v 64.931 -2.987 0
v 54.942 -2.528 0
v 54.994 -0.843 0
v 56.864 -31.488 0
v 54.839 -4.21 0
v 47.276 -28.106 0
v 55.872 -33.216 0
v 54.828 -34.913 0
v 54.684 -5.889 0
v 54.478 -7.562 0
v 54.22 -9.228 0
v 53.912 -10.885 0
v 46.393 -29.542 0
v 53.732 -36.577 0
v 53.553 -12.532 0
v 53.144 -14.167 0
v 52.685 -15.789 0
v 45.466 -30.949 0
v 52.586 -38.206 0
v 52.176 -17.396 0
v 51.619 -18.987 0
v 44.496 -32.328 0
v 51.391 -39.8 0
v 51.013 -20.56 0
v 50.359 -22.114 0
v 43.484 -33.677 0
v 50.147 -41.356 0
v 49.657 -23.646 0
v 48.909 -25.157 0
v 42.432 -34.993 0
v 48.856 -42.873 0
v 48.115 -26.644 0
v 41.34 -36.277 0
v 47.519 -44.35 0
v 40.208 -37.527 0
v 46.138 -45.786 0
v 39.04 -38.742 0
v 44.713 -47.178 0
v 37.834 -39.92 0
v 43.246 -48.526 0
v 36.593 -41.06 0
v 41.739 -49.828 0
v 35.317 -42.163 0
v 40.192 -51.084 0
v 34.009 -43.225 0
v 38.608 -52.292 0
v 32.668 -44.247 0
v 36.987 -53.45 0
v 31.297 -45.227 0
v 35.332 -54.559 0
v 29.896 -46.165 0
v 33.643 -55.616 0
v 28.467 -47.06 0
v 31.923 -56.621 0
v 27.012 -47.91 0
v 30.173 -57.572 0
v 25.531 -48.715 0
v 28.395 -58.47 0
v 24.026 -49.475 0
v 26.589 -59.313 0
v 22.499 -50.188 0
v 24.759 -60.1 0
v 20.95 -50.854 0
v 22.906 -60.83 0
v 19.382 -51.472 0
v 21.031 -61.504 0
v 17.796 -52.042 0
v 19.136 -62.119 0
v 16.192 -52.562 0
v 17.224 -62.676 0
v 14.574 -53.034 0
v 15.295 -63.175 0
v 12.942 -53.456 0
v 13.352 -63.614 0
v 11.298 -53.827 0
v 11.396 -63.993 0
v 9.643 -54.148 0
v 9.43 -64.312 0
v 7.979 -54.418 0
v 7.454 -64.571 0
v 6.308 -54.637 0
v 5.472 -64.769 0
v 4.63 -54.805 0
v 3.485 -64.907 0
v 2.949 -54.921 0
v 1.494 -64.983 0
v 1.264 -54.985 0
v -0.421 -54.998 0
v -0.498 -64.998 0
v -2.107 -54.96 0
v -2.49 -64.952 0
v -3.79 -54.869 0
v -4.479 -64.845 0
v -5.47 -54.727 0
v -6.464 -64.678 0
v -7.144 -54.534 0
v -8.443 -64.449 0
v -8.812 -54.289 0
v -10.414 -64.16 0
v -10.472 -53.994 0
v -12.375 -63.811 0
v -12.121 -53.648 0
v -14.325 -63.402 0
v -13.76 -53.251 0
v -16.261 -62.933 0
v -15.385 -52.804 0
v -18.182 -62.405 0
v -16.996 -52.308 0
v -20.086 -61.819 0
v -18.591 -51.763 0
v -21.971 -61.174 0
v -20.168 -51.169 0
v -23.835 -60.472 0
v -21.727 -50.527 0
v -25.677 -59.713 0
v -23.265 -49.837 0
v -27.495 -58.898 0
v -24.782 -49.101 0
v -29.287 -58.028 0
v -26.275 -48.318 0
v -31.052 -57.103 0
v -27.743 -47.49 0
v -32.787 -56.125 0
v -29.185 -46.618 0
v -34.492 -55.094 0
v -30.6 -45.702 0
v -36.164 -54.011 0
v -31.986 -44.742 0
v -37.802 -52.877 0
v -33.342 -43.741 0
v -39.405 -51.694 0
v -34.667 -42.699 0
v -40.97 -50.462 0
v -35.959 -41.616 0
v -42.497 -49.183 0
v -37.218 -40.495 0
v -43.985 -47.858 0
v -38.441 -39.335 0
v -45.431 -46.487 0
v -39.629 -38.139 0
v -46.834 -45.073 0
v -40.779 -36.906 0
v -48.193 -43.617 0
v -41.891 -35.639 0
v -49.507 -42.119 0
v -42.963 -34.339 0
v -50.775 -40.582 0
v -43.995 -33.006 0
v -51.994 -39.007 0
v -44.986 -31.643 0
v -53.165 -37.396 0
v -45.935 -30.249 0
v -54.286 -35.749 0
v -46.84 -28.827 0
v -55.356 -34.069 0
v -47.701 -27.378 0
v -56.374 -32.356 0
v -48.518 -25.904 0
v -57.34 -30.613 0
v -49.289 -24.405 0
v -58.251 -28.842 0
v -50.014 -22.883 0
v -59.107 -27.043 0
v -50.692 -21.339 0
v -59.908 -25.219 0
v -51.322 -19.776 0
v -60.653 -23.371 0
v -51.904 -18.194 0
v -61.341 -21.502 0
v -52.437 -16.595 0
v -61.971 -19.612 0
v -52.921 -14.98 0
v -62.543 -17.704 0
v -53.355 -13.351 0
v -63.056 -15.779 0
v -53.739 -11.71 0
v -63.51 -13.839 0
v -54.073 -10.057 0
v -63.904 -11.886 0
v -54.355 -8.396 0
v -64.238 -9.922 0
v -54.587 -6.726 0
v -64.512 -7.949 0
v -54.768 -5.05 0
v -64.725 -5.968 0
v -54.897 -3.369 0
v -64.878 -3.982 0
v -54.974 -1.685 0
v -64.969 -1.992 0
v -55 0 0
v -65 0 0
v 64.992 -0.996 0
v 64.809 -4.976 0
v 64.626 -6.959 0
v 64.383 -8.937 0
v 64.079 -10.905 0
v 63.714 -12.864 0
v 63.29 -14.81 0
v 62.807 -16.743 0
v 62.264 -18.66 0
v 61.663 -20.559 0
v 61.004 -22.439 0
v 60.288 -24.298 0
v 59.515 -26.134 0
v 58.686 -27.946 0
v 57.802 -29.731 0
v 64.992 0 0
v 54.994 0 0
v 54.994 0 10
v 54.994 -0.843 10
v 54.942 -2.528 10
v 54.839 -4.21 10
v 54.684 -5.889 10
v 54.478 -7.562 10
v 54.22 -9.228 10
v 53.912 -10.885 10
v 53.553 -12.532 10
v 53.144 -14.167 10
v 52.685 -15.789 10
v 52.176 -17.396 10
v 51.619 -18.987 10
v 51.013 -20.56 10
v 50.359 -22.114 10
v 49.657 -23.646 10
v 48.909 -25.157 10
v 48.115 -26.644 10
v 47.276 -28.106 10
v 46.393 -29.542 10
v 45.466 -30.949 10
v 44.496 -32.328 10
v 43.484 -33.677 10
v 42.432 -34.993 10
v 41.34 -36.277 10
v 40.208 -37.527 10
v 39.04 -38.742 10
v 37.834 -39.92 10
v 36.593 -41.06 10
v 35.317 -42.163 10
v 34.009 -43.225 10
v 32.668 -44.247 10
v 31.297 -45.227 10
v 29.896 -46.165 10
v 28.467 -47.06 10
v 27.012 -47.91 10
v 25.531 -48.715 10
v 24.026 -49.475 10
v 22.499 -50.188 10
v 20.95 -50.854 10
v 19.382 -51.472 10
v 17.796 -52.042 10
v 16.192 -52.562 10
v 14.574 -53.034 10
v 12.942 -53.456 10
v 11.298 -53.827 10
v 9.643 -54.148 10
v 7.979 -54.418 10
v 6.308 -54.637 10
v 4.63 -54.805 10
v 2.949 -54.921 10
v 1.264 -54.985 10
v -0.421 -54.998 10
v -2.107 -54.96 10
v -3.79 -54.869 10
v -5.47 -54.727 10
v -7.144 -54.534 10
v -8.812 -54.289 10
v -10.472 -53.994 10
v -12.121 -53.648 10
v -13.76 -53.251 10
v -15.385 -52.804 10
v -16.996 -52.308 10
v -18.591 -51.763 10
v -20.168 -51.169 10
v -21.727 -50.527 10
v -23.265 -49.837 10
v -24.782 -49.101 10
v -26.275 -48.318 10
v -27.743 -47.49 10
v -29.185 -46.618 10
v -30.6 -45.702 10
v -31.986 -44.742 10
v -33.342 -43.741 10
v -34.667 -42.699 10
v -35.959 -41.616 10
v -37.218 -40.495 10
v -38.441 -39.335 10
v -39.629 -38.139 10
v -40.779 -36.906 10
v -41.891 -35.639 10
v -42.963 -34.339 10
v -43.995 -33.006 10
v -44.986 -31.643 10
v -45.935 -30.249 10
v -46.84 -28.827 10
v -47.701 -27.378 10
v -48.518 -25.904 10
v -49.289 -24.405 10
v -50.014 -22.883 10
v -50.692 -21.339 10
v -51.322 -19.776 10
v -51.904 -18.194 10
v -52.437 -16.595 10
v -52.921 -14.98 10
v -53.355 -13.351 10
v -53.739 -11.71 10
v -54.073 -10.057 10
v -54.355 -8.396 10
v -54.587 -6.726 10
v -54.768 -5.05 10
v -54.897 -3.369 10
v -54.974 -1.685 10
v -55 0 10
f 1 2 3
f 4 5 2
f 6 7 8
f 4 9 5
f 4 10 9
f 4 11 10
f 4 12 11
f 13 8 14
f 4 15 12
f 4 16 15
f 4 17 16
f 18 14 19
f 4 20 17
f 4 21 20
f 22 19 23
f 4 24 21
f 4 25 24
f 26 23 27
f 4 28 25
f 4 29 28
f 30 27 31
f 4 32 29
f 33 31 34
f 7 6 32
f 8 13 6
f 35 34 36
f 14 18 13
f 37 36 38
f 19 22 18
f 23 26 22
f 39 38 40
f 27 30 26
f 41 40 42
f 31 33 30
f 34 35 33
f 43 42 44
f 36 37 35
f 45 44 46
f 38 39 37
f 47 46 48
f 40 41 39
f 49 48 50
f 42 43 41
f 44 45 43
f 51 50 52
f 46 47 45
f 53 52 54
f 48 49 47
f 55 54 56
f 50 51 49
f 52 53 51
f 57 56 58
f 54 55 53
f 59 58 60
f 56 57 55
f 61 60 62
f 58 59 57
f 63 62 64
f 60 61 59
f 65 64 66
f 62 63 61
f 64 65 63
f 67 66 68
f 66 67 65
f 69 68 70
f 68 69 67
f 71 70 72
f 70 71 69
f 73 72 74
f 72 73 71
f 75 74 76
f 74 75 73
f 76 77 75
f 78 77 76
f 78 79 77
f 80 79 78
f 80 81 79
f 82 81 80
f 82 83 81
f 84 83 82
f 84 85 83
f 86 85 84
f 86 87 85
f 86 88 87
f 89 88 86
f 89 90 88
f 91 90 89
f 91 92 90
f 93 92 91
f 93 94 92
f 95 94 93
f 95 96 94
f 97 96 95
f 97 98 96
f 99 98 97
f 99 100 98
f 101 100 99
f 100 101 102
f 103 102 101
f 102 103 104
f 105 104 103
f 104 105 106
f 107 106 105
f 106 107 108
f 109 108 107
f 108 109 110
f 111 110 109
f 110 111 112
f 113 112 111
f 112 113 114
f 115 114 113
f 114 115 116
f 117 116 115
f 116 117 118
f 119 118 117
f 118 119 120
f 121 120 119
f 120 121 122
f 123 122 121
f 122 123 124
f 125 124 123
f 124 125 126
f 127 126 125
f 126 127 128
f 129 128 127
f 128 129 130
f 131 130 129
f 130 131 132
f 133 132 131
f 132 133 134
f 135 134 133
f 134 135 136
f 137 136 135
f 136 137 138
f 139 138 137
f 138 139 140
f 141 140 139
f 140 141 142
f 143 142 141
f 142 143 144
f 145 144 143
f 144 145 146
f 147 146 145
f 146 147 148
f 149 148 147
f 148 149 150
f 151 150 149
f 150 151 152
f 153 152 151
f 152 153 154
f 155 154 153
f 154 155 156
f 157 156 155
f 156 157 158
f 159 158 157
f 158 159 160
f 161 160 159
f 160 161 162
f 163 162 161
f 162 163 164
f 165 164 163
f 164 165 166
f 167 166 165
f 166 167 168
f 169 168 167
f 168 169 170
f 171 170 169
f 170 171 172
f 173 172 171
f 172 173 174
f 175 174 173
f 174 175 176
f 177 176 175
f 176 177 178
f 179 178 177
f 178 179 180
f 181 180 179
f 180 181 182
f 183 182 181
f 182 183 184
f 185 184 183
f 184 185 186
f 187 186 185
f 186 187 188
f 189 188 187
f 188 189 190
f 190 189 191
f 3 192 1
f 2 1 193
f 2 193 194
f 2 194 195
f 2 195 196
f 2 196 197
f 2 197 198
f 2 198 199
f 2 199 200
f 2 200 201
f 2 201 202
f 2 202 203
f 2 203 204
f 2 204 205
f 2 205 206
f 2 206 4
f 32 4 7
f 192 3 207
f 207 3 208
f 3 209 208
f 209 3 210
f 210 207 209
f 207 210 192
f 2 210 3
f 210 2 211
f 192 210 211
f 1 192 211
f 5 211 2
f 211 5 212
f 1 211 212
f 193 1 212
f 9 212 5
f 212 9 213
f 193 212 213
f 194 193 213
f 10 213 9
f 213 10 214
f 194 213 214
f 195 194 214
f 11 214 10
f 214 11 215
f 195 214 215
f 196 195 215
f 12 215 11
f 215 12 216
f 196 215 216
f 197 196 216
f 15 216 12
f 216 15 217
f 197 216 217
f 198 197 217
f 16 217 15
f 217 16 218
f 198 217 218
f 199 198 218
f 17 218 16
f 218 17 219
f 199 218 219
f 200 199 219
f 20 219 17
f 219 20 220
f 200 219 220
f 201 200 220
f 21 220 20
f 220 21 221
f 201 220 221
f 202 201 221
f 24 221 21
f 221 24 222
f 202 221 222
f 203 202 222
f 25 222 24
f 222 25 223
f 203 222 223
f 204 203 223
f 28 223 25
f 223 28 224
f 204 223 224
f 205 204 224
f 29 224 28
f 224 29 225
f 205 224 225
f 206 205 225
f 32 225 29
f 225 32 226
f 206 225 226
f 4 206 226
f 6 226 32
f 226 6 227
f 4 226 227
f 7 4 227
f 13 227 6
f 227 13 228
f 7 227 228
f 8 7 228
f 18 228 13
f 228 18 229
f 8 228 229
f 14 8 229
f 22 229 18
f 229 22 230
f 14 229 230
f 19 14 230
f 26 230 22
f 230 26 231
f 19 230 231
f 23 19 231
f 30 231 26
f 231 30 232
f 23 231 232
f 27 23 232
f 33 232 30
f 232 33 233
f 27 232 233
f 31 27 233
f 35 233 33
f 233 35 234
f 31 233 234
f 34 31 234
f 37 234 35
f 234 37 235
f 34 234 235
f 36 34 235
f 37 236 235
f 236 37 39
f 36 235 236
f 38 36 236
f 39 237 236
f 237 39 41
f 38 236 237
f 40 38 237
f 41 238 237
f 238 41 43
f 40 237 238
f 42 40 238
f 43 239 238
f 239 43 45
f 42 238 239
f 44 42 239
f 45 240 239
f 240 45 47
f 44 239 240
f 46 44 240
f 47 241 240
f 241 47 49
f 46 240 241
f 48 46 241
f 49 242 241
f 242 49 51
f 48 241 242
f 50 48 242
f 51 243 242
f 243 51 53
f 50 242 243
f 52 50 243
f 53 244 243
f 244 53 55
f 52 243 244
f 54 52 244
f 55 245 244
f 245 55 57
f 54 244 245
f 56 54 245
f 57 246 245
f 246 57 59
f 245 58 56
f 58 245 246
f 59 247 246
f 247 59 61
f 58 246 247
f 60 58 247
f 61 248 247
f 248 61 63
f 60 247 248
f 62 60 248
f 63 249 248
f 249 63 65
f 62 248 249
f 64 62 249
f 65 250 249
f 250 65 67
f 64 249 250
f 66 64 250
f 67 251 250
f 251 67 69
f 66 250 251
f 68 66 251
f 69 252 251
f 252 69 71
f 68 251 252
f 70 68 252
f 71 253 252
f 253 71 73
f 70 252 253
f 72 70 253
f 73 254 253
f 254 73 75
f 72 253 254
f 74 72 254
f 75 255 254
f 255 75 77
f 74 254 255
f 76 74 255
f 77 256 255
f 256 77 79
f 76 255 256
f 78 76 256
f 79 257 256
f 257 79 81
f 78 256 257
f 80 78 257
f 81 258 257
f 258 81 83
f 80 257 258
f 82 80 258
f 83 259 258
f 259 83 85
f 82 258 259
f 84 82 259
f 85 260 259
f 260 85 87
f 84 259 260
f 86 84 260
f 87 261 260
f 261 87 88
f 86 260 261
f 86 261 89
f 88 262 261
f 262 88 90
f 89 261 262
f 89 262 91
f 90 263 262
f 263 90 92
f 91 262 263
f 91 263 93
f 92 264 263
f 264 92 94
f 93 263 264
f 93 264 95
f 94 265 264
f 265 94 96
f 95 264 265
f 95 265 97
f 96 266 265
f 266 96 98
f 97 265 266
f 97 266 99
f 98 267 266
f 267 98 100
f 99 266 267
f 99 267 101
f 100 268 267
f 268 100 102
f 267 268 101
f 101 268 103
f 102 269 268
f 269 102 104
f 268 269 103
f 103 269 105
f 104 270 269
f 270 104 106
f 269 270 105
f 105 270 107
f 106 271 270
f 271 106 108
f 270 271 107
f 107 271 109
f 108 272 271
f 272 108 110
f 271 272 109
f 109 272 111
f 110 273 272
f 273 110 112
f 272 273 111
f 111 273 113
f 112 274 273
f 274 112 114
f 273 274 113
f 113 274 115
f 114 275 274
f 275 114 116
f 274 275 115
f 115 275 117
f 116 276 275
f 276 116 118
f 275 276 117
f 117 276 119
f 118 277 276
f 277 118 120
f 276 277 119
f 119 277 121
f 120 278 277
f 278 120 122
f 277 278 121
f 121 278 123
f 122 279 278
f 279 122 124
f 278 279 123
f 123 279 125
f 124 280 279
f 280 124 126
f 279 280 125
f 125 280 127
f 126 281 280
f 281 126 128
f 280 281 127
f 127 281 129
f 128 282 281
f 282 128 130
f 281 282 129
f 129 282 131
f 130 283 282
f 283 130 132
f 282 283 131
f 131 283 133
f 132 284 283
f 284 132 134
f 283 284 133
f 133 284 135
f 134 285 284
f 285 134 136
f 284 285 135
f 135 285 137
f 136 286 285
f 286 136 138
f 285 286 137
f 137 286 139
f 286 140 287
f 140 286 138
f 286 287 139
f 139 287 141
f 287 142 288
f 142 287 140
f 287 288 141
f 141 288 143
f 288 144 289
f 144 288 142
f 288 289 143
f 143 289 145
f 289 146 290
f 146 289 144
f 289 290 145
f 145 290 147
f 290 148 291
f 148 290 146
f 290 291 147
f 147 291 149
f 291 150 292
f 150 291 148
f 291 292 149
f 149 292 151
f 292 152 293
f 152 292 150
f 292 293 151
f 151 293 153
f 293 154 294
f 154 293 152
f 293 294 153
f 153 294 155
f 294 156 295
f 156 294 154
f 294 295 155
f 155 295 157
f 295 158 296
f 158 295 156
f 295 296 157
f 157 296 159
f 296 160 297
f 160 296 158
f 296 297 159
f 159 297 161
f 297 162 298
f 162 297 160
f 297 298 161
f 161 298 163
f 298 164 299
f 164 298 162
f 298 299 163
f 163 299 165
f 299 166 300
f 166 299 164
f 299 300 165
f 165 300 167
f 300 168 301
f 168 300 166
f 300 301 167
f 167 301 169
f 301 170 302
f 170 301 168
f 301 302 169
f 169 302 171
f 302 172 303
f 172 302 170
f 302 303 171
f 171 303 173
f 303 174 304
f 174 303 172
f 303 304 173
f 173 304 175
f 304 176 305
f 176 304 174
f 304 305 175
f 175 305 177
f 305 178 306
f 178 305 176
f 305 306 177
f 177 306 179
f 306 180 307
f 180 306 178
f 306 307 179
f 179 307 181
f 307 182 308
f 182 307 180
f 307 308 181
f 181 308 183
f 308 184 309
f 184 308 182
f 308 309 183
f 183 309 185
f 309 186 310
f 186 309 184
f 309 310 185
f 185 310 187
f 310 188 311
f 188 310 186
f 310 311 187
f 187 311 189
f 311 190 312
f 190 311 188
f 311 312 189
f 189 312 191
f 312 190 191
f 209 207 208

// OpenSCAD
d=55;
h=10;

difference()
{
    rotate_extrude(convexity = 10, $fa=1)
    polygon(points=[[d,0],[d+h,0],[d,h]]);
    
    translate([-d-h-0.05,0,-.05])
    cube([2*d+d*h+0.1,d+h+0.1,h+0.1]);
    
};
